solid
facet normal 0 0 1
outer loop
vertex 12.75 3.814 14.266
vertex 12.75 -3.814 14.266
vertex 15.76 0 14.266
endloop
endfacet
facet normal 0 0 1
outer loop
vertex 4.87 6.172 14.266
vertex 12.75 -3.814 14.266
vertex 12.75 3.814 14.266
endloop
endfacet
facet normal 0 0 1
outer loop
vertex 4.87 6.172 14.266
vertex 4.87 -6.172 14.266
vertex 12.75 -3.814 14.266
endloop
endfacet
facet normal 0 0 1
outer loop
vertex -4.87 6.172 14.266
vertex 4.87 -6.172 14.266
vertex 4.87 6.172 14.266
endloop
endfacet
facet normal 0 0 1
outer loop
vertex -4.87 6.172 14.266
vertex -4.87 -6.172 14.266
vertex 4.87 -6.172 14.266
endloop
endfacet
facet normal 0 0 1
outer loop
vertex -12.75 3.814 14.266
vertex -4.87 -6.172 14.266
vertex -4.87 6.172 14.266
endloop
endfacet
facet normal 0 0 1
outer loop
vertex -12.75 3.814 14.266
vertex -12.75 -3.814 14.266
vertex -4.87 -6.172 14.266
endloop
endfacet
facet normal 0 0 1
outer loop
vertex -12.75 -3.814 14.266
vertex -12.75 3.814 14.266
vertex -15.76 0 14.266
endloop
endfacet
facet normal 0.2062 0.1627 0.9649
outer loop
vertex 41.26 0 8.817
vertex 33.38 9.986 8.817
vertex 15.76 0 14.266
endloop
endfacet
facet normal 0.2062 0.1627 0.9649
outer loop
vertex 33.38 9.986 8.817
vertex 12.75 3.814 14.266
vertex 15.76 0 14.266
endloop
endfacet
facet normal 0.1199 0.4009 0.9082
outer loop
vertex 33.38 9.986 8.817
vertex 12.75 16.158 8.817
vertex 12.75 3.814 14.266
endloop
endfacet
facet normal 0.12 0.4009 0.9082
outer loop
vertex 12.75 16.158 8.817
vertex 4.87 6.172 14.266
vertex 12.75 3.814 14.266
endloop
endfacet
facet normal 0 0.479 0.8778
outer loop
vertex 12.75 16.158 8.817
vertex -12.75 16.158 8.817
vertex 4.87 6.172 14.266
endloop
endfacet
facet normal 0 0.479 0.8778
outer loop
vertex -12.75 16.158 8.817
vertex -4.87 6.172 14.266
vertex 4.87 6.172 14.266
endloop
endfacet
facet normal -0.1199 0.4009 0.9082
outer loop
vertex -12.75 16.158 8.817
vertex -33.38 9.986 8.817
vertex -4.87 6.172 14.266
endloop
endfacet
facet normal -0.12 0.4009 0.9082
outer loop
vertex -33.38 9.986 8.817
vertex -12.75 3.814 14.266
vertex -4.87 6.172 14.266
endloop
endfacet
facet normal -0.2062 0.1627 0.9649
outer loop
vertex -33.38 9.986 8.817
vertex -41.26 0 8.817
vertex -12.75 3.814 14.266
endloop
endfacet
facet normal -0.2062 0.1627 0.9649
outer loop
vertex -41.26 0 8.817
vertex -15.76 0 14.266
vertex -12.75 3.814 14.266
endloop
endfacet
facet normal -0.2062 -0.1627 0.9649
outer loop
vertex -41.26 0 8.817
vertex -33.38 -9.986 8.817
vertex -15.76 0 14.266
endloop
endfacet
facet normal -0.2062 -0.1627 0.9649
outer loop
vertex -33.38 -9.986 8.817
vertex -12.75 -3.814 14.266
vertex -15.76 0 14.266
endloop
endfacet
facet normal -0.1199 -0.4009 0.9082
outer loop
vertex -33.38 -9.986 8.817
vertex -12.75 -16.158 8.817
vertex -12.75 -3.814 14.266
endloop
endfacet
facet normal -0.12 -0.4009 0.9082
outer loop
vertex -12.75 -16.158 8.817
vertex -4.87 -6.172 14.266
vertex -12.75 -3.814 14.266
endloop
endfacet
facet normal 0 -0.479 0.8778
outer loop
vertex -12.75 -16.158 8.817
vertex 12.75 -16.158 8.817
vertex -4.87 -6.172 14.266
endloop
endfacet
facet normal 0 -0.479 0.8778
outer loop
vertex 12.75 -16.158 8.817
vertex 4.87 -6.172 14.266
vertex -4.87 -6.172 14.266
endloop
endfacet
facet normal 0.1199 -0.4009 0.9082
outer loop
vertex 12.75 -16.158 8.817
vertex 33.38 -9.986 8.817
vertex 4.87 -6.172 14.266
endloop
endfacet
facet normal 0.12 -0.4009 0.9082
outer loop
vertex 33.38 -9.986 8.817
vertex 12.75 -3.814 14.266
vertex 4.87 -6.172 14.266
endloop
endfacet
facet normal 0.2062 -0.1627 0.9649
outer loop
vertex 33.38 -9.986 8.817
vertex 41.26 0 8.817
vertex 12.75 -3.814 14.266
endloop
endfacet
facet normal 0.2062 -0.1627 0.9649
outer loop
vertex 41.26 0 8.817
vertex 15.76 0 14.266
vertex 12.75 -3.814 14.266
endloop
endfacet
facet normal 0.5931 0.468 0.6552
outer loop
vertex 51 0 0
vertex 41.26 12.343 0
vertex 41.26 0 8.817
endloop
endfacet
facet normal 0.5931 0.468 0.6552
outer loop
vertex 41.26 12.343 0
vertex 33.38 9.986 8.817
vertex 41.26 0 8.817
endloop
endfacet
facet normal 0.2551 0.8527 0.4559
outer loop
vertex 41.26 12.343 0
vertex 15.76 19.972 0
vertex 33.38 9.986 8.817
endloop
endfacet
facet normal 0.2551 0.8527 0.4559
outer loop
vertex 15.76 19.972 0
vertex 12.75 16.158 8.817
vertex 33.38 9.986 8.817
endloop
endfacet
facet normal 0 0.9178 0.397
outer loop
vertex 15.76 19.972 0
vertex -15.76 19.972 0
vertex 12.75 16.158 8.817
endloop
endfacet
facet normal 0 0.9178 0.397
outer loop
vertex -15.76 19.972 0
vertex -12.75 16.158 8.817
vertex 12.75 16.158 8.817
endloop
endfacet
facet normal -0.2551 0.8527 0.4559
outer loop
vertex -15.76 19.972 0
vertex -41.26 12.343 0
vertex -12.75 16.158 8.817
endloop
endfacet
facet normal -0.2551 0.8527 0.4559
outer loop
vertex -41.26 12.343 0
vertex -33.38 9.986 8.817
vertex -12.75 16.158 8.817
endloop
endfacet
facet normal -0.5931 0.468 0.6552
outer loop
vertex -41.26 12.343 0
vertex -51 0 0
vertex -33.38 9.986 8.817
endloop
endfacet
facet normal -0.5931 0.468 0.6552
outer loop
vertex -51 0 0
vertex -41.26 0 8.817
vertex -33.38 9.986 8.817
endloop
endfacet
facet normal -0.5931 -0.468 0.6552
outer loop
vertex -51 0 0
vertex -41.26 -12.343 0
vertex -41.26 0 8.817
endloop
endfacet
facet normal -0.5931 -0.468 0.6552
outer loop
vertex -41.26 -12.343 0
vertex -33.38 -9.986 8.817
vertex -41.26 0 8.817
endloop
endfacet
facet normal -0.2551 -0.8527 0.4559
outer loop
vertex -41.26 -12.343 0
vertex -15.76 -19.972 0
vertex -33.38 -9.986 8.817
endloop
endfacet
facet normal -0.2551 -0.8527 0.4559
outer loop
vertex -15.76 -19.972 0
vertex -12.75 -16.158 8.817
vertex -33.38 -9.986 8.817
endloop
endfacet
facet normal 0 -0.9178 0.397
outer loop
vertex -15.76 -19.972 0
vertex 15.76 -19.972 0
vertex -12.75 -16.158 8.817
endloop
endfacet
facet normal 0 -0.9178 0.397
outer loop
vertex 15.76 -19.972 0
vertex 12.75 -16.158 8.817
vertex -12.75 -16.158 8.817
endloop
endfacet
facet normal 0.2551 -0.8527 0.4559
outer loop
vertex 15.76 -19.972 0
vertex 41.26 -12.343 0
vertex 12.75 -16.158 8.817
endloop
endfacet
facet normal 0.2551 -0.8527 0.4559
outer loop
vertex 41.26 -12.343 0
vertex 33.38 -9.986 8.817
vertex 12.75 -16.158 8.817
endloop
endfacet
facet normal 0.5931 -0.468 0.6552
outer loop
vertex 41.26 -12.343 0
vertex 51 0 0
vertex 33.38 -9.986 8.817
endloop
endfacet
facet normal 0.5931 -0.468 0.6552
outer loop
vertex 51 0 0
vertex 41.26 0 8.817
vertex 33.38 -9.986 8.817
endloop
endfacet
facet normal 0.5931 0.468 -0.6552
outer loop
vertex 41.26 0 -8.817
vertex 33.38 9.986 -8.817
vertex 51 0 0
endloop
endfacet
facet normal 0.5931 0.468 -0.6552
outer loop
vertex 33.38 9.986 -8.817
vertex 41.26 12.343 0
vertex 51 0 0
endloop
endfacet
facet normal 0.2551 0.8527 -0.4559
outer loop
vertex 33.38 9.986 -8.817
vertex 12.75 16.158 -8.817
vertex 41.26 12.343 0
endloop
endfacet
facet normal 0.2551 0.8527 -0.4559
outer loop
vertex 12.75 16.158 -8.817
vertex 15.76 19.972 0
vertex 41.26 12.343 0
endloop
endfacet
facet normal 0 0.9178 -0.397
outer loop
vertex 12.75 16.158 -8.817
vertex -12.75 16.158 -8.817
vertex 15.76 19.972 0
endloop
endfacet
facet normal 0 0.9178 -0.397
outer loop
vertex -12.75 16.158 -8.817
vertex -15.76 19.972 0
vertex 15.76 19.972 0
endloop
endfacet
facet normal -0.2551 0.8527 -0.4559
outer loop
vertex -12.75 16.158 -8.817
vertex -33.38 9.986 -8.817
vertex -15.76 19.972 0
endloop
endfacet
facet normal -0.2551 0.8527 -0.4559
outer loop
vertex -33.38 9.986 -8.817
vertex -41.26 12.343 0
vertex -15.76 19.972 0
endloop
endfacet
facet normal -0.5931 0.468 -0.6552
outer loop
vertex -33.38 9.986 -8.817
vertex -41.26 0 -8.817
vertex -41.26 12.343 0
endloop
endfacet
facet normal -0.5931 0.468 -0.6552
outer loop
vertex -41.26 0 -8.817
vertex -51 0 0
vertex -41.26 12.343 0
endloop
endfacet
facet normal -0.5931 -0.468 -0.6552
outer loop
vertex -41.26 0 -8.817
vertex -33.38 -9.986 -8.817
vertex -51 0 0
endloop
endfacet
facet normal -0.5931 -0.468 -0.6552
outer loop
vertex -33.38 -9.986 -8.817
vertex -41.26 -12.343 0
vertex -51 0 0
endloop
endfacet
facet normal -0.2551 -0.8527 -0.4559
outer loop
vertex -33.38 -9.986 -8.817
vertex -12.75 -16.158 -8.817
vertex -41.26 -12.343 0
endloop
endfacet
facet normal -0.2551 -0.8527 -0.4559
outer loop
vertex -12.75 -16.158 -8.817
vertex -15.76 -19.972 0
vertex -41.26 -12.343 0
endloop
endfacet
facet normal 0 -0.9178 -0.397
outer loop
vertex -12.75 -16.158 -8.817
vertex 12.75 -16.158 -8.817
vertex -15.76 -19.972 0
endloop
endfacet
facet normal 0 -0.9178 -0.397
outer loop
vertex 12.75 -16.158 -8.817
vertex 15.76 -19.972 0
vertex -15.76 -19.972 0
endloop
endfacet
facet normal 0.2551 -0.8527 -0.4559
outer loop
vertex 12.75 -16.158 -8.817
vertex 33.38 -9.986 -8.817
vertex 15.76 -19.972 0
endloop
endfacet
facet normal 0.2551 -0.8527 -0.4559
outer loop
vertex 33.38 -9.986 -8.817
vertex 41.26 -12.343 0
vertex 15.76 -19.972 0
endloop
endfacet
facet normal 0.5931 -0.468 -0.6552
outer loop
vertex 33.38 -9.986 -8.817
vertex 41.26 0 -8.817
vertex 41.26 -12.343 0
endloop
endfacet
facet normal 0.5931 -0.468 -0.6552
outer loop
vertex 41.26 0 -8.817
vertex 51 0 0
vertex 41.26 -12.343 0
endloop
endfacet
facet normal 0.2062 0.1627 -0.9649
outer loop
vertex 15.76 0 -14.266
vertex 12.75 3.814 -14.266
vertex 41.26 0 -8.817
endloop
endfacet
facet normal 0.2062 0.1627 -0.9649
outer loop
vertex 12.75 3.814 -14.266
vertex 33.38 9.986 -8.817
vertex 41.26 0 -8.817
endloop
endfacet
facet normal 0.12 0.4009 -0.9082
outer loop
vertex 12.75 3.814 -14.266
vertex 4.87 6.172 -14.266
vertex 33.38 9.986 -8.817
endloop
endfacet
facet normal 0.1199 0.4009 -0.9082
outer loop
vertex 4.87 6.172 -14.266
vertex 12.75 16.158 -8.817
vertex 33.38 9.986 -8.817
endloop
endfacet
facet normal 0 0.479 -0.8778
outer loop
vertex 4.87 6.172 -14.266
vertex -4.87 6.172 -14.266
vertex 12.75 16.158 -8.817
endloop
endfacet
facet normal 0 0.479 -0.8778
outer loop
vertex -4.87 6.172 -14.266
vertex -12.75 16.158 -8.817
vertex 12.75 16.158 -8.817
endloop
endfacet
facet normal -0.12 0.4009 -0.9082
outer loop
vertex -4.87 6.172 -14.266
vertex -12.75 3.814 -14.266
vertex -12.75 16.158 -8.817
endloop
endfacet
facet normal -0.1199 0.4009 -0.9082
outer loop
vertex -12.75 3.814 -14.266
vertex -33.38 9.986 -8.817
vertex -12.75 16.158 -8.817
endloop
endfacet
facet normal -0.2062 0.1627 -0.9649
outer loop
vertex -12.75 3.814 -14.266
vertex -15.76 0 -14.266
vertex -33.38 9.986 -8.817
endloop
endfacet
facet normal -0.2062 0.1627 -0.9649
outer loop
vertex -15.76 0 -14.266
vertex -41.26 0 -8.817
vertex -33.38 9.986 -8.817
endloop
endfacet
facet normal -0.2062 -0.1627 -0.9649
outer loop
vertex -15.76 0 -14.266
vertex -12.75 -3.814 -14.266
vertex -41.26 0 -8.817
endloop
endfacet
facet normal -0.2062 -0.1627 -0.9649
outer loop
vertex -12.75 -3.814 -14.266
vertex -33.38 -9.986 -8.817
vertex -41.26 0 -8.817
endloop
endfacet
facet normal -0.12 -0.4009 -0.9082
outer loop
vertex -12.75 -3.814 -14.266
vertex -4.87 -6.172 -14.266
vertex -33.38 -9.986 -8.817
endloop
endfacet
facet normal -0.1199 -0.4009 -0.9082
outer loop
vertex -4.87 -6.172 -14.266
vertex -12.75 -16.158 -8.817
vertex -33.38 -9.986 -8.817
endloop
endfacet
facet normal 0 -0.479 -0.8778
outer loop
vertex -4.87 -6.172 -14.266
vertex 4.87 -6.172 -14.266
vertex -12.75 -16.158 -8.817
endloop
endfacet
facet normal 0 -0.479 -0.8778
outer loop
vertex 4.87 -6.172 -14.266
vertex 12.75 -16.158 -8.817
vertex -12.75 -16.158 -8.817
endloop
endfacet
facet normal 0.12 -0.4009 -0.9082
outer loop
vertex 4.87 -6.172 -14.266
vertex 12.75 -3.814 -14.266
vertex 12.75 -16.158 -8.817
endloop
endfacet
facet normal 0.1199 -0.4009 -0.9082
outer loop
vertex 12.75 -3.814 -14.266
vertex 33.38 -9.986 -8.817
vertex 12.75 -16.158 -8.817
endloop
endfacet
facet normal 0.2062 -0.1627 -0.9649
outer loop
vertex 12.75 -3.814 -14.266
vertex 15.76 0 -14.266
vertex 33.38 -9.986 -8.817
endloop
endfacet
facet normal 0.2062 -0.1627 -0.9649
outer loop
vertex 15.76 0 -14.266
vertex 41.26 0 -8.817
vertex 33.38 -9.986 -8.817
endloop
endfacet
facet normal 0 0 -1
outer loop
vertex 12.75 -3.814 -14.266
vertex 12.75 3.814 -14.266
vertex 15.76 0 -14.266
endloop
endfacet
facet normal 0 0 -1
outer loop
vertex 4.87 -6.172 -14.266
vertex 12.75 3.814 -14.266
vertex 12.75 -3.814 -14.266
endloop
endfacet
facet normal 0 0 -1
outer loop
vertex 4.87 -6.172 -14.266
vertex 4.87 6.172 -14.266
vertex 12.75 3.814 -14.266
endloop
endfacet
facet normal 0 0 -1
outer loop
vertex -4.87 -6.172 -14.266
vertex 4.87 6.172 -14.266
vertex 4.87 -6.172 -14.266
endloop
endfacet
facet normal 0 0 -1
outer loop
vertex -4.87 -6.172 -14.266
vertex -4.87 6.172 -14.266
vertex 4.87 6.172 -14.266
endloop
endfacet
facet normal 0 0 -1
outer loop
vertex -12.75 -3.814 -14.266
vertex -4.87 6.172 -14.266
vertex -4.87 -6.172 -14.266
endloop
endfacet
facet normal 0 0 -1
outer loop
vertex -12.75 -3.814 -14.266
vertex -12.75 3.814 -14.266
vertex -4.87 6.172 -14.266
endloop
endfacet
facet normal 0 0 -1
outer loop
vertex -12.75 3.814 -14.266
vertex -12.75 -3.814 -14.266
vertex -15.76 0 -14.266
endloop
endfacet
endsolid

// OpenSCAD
// Generated by SolidPython 1.0.1 on 2020-07-29 00:46:52


scale(v = [17, 7, 5]) {
	sphere(r = 3);
}
/***********************************************
*********      SolidPython code:      **********
************************************************
 
# import packages: SolidPython
from solid import *
from solid.utils import *
from itertools import chain, combinations, permutations


class Resize:

    def __init__(self, scad_file):
        self.scad_file = scad_file
        #self.scad_file = import_scad(scad_file)
        # cone/cylinder param:
        self.r1 = 0
        self.r2 = 0
        self.h = 0
        # rectangular prism param:
        self.w = 0
        self.l = 0
        # ellipse param:
        self.r = 0

    # import OpenScad code (file name corresponds to shape)


    # classify shape + parameters
    def assign(self, param1, param2, param3):
        if self.scad_file == 'cone.scad':
            self.r1 = param1
            self.r2 = param2
            self.h = param3
        elif self.scad_file == 'cylinder.scad':
            self.r1 = param1
            self.r2 = param2
            self.h = param3
        elif self.scad_file == 'rectangularPrism.scad':
            self.h = param1
            self.l = param2
            self.w = param3
        else:
            self.r = param1
            self.h = param2

    # resize parameters
    def iterate(self):
        x = range(3, 20, 2)
        i = 1
        if self.scad_file == 'cone.scad':
            tempList = list(permutations(x, 2))
            for temp in tempList:
                param1 = temp[0]
                param2 = temp[1]
                filepath = 'produced_scad_files/' + 'cone' + str(param1) + '_' + str(param2) + '_' + '.scad'
                scad_render_to_file(cylinder(h=param1, r1=param2, r2=0), filepath)

        elif self.scad_file == 'cylinder.scad':
            tempList = list(permutations(x, 3))
            for temp in tempList:
                param1 = temp[0]
                param2 = temp[1]
                filepath = 'produced_scad_files/' + 'cylinder' + str(param1) + '_' + str(param2) + '_' + '.scad'
                scad_render_to_file(cylinder(h=param1, r1=param2, r2=param2), filepath)

        elif self.scad_file == 'rectangularPrism.scad':
            tempList = list(permutations(x, 3))
            for temp in tempList:
                param1 = temp[0]
                param2 = temp[1]
                param3 = temp[2]
                filepath = 'produced_scad_files/' + 'rectangularPrism' + str(param1) + '_' + str(param2) + '_' + str(
                    param3) + '.scad'
                scad_render_to_file(cube(size=(param1, param2, param3)), filepath)

        elif self.scad_file == 'ellipse.scad':
            tempList = list(permutations(x, 4))
            for temp in tempList:
                param1 = temp[0]
                param2 = temp[1]
                param3 = temp[2]
                param4 = temp[3]
                filepath = 'produced_scad_files/' + 'ellipse' + str(param1) + '_' + str(param2) + '_' + str(param3) + '_' + str(param4) + '.scad'
                scad_render_to_file(scale([param1, param2, param3])(sphere(r=param4)), filepath)

    def render_to_scadfile(self):
        scad_render_to_file(scad, 'example.scad') 
 
************************************************/
